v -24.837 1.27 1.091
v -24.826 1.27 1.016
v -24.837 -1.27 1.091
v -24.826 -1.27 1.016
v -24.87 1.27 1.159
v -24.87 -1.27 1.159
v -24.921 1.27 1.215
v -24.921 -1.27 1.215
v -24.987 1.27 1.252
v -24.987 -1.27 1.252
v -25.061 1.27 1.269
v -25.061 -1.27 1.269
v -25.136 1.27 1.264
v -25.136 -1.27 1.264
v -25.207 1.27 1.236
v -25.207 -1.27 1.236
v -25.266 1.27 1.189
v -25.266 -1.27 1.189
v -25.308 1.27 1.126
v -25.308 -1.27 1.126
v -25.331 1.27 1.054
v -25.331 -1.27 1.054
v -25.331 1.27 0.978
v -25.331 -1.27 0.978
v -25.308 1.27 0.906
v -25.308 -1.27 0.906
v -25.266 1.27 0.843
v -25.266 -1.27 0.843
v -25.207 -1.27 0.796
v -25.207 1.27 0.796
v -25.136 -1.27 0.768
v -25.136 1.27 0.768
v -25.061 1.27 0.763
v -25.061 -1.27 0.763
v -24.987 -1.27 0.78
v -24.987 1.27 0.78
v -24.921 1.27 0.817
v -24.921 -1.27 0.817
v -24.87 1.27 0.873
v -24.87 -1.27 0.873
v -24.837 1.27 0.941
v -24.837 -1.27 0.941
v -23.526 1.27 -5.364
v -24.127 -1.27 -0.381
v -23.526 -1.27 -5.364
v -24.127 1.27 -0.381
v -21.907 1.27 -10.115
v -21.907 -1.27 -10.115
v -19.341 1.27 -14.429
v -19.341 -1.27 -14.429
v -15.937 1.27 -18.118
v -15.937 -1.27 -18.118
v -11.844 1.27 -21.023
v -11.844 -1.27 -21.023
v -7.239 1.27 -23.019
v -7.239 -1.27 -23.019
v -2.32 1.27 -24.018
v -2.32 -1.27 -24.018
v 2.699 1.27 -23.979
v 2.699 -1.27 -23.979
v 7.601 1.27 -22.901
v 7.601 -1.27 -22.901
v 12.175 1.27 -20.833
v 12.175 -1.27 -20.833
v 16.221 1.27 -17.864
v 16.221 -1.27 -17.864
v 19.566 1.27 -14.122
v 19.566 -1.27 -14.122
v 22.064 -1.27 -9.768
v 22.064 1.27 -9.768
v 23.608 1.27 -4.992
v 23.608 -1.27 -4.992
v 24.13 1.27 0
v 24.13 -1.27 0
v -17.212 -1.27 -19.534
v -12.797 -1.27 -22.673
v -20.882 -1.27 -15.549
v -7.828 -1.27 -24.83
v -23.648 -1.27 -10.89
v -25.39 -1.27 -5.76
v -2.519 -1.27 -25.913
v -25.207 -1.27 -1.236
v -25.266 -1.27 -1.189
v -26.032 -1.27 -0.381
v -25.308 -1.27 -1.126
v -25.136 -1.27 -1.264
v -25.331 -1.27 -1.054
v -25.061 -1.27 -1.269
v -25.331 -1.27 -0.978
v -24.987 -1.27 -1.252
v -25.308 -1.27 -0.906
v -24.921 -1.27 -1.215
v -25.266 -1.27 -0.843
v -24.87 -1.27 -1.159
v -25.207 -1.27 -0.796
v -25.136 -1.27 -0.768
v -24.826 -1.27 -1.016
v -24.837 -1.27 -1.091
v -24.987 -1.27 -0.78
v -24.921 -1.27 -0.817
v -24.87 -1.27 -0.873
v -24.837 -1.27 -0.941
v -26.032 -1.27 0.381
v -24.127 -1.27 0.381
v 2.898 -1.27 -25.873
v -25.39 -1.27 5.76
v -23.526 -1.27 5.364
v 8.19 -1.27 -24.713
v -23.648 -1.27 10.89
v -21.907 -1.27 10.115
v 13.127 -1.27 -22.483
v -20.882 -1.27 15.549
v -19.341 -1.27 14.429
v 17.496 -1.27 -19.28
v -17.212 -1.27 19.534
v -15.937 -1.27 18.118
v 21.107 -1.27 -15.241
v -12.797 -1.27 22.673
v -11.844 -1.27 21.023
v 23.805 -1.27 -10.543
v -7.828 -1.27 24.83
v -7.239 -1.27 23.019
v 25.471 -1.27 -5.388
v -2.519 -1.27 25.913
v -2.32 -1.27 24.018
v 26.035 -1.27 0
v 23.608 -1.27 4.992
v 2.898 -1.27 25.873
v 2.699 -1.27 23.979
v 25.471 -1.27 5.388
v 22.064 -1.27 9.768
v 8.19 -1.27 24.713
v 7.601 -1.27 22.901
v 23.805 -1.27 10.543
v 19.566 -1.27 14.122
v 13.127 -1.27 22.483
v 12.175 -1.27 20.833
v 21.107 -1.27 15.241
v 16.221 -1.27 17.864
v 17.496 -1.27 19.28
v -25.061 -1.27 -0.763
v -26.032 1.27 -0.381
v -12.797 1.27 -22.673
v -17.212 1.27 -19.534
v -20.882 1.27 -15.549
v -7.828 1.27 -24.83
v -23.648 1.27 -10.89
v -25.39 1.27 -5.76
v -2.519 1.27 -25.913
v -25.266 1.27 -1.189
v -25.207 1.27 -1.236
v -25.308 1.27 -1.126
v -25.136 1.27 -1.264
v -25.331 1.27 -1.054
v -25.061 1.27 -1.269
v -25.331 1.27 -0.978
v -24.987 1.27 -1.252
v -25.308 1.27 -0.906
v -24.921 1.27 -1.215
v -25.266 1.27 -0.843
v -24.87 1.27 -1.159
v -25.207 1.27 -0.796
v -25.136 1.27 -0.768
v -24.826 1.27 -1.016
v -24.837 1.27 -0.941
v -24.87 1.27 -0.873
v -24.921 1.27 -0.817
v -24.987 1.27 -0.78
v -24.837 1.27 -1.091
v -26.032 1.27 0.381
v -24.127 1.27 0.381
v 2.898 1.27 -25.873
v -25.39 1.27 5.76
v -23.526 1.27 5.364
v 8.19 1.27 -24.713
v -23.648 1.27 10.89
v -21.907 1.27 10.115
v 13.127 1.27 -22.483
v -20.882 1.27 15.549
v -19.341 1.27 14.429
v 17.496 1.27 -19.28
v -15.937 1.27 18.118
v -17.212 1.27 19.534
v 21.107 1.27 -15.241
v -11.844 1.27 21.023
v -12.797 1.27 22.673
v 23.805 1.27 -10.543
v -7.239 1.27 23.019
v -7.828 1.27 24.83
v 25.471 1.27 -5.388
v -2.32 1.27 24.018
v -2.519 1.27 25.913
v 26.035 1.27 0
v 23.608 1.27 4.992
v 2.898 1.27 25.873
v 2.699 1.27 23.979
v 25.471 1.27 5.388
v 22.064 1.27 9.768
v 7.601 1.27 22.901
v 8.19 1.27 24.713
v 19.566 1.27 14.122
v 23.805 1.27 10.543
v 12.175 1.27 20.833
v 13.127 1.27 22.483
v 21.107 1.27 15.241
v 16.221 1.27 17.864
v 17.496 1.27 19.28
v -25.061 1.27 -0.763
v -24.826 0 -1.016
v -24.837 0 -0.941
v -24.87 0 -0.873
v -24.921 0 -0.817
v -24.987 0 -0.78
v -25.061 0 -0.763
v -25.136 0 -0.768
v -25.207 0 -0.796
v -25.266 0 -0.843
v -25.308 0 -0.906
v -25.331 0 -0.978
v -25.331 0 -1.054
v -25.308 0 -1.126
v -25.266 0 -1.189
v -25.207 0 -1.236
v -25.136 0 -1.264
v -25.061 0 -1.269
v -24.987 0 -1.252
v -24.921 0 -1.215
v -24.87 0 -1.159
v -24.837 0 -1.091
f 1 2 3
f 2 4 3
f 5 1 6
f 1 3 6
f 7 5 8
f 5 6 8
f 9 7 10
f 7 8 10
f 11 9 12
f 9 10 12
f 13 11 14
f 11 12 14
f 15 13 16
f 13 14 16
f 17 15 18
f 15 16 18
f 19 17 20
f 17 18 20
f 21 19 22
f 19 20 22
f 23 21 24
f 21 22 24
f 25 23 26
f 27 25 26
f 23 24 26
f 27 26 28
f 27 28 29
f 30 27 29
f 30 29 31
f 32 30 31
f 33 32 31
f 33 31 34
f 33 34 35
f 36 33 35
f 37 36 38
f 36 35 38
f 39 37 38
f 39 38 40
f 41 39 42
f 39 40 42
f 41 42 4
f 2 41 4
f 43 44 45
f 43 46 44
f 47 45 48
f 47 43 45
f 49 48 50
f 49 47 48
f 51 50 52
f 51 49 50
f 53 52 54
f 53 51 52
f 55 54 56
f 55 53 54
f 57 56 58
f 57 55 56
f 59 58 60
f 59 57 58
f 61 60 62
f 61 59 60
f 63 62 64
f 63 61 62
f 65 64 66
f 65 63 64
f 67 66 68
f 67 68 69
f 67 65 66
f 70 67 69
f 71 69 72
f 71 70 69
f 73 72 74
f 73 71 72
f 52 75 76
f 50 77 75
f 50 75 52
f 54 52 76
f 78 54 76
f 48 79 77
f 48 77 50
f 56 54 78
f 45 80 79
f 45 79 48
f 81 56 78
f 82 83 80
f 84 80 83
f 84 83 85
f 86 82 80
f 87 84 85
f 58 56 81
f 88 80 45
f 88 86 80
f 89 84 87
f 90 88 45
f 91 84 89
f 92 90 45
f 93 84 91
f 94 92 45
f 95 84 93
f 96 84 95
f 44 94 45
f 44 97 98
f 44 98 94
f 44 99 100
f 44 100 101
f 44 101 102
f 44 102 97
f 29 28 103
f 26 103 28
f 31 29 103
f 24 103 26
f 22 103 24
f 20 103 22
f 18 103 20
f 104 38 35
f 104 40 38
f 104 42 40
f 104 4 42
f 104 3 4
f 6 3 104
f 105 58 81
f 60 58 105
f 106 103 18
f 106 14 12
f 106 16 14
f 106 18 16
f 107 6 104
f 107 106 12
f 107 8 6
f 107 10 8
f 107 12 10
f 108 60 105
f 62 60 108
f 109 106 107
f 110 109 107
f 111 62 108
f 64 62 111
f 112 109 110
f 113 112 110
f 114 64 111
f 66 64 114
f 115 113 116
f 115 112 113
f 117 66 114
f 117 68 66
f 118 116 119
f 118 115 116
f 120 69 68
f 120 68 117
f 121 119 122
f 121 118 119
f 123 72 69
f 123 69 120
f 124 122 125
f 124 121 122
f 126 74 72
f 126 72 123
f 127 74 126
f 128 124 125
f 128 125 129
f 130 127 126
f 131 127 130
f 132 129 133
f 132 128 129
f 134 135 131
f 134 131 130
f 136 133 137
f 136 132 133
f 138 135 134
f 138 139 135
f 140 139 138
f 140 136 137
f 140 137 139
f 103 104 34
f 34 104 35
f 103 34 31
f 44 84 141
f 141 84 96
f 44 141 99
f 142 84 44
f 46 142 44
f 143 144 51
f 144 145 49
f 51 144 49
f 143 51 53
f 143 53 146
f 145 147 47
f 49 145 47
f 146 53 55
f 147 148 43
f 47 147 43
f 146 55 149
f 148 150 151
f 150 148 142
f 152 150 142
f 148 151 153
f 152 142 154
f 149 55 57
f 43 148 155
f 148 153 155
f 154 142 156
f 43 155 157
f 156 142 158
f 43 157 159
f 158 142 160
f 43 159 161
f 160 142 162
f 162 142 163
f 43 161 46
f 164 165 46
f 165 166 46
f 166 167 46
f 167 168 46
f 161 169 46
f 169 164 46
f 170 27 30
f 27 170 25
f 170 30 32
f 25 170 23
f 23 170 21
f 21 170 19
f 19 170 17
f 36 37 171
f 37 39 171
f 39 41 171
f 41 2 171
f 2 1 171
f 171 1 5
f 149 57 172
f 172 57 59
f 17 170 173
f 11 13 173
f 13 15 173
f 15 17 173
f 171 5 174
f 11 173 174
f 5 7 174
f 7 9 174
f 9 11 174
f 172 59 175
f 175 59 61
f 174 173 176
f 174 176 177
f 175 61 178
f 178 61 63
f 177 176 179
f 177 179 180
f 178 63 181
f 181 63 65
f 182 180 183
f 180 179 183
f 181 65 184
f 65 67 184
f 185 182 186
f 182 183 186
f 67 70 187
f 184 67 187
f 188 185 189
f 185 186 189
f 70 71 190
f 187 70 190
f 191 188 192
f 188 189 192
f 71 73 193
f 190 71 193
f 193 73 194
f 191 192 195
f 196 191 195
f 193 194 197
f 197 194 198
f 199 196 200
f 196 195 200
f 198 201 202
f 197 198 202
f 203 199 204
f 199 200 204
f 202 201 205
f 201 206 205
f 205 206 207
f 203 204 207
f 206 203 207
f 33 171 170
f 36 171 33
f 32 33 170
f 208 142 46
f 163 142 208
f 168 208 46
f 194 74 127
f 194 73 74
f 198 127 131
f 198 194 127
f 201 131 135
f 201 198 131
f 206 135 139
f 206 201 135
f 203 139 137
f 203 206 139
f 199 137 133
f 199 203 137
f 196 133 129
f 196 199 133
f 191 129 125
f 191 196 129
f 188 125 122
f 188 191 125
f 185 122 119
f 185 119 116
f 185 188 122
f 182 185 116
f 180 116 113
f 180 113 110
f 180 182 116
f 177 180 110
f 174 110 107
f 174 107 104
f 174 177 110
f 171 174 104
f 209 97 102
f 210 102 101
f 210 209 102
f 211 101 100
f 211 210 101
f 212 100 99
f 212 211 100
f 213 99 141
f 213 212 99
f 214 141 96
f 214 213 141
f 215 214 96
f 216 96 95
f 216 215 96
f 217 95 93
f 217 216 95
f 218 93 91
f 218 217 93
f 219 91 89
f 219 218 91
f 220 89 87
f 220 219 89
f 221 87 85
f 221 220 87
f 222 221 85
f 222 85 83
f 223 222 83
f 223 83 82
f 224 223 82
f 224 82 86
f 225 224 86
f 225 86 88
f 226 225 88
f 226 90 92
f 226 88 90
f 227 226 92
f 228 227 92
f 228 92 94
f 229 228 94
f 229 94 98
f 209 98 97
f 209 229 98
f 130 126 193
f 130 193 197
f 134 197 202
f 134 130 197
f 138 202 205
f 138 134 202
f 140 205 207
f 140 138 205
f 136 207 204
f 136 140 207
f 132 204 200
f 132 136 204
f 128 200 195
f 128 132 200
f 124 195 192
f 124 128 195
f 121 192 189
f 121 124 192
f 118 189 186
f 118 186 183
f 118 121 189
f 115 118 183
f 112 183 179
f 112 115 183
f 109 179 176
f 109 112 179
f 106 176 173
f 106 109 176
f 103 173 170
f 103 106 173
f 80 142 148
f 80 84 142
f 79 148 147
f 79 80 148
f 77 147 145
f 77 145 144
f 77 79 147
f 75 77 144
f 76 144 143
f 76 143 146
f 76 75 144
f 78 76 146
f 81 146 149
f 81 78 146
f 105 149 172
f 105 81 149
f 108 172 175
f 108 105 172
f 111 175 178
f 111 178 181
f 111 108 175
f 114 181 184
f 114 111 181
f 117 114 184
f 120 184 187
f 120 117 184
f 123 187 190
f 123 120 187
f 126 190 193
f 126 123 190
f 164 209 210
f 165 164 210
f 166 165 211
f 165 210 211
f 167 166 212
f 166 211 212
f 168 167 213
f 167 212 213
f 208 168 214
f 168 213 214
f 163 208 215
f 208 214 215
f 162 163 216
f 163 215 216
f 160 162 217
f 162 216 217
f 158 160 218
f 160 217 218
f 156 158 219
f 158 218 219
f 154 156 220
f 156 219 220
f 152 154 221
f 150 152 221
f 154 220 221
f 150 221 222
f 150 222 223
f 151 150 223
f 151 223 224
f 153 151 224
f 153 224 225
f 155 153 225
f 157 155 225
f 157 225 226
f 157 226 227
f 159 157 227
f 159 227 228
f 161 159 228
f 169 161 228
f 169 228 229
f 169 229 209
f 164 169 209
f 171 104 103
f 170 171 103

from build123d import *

# Parameters (mm, degrees)
F0_R     = 26.035
F0_R_2   = 24.13
F1_DEPTH = 1.27
F2_R     = 0.254
F3_DEPTH = 12.7


with BuildPart() as f1:
    # F0 (on Front) → F1 (new body, symmetric)
    with BuildSketch(Plane.XZ):
        Circle(F0_R)
        Circle(F0_R_2, mode=Mode.SUBTRACT)
    extrude(amount=F1_DEPTH, both=True)

    # F2 (on Front) → F3 (cut, symmetric)
    with BuildSketch(Plane.XZ):
        with BuildLine():
            Line((-24.1269919178, 0.381), (-26.0322120458, 0.381))
            ThreePointArc((-26.0322120458, 0.381), (-26.035, 0), (-26.0322120458, -0.381))
            Line((-26.0322120458, -0.381), (-24.1269919178, -0.381))
            ThreePointArc((-24.1269919178, -0.381), (-24.13, 0), (-24.1269919178, 0.381))
        make_face()
        with Locations((-25.0796019818, -1.016)):
            Circle(F2_R)
        with Locations((-25.0796019818, 1.016)):
            Circle(F2_R)
    extrude(amount=F3_DEPTH, both=True, mode=Mode.SUBTRACT)


solid = f1.part
